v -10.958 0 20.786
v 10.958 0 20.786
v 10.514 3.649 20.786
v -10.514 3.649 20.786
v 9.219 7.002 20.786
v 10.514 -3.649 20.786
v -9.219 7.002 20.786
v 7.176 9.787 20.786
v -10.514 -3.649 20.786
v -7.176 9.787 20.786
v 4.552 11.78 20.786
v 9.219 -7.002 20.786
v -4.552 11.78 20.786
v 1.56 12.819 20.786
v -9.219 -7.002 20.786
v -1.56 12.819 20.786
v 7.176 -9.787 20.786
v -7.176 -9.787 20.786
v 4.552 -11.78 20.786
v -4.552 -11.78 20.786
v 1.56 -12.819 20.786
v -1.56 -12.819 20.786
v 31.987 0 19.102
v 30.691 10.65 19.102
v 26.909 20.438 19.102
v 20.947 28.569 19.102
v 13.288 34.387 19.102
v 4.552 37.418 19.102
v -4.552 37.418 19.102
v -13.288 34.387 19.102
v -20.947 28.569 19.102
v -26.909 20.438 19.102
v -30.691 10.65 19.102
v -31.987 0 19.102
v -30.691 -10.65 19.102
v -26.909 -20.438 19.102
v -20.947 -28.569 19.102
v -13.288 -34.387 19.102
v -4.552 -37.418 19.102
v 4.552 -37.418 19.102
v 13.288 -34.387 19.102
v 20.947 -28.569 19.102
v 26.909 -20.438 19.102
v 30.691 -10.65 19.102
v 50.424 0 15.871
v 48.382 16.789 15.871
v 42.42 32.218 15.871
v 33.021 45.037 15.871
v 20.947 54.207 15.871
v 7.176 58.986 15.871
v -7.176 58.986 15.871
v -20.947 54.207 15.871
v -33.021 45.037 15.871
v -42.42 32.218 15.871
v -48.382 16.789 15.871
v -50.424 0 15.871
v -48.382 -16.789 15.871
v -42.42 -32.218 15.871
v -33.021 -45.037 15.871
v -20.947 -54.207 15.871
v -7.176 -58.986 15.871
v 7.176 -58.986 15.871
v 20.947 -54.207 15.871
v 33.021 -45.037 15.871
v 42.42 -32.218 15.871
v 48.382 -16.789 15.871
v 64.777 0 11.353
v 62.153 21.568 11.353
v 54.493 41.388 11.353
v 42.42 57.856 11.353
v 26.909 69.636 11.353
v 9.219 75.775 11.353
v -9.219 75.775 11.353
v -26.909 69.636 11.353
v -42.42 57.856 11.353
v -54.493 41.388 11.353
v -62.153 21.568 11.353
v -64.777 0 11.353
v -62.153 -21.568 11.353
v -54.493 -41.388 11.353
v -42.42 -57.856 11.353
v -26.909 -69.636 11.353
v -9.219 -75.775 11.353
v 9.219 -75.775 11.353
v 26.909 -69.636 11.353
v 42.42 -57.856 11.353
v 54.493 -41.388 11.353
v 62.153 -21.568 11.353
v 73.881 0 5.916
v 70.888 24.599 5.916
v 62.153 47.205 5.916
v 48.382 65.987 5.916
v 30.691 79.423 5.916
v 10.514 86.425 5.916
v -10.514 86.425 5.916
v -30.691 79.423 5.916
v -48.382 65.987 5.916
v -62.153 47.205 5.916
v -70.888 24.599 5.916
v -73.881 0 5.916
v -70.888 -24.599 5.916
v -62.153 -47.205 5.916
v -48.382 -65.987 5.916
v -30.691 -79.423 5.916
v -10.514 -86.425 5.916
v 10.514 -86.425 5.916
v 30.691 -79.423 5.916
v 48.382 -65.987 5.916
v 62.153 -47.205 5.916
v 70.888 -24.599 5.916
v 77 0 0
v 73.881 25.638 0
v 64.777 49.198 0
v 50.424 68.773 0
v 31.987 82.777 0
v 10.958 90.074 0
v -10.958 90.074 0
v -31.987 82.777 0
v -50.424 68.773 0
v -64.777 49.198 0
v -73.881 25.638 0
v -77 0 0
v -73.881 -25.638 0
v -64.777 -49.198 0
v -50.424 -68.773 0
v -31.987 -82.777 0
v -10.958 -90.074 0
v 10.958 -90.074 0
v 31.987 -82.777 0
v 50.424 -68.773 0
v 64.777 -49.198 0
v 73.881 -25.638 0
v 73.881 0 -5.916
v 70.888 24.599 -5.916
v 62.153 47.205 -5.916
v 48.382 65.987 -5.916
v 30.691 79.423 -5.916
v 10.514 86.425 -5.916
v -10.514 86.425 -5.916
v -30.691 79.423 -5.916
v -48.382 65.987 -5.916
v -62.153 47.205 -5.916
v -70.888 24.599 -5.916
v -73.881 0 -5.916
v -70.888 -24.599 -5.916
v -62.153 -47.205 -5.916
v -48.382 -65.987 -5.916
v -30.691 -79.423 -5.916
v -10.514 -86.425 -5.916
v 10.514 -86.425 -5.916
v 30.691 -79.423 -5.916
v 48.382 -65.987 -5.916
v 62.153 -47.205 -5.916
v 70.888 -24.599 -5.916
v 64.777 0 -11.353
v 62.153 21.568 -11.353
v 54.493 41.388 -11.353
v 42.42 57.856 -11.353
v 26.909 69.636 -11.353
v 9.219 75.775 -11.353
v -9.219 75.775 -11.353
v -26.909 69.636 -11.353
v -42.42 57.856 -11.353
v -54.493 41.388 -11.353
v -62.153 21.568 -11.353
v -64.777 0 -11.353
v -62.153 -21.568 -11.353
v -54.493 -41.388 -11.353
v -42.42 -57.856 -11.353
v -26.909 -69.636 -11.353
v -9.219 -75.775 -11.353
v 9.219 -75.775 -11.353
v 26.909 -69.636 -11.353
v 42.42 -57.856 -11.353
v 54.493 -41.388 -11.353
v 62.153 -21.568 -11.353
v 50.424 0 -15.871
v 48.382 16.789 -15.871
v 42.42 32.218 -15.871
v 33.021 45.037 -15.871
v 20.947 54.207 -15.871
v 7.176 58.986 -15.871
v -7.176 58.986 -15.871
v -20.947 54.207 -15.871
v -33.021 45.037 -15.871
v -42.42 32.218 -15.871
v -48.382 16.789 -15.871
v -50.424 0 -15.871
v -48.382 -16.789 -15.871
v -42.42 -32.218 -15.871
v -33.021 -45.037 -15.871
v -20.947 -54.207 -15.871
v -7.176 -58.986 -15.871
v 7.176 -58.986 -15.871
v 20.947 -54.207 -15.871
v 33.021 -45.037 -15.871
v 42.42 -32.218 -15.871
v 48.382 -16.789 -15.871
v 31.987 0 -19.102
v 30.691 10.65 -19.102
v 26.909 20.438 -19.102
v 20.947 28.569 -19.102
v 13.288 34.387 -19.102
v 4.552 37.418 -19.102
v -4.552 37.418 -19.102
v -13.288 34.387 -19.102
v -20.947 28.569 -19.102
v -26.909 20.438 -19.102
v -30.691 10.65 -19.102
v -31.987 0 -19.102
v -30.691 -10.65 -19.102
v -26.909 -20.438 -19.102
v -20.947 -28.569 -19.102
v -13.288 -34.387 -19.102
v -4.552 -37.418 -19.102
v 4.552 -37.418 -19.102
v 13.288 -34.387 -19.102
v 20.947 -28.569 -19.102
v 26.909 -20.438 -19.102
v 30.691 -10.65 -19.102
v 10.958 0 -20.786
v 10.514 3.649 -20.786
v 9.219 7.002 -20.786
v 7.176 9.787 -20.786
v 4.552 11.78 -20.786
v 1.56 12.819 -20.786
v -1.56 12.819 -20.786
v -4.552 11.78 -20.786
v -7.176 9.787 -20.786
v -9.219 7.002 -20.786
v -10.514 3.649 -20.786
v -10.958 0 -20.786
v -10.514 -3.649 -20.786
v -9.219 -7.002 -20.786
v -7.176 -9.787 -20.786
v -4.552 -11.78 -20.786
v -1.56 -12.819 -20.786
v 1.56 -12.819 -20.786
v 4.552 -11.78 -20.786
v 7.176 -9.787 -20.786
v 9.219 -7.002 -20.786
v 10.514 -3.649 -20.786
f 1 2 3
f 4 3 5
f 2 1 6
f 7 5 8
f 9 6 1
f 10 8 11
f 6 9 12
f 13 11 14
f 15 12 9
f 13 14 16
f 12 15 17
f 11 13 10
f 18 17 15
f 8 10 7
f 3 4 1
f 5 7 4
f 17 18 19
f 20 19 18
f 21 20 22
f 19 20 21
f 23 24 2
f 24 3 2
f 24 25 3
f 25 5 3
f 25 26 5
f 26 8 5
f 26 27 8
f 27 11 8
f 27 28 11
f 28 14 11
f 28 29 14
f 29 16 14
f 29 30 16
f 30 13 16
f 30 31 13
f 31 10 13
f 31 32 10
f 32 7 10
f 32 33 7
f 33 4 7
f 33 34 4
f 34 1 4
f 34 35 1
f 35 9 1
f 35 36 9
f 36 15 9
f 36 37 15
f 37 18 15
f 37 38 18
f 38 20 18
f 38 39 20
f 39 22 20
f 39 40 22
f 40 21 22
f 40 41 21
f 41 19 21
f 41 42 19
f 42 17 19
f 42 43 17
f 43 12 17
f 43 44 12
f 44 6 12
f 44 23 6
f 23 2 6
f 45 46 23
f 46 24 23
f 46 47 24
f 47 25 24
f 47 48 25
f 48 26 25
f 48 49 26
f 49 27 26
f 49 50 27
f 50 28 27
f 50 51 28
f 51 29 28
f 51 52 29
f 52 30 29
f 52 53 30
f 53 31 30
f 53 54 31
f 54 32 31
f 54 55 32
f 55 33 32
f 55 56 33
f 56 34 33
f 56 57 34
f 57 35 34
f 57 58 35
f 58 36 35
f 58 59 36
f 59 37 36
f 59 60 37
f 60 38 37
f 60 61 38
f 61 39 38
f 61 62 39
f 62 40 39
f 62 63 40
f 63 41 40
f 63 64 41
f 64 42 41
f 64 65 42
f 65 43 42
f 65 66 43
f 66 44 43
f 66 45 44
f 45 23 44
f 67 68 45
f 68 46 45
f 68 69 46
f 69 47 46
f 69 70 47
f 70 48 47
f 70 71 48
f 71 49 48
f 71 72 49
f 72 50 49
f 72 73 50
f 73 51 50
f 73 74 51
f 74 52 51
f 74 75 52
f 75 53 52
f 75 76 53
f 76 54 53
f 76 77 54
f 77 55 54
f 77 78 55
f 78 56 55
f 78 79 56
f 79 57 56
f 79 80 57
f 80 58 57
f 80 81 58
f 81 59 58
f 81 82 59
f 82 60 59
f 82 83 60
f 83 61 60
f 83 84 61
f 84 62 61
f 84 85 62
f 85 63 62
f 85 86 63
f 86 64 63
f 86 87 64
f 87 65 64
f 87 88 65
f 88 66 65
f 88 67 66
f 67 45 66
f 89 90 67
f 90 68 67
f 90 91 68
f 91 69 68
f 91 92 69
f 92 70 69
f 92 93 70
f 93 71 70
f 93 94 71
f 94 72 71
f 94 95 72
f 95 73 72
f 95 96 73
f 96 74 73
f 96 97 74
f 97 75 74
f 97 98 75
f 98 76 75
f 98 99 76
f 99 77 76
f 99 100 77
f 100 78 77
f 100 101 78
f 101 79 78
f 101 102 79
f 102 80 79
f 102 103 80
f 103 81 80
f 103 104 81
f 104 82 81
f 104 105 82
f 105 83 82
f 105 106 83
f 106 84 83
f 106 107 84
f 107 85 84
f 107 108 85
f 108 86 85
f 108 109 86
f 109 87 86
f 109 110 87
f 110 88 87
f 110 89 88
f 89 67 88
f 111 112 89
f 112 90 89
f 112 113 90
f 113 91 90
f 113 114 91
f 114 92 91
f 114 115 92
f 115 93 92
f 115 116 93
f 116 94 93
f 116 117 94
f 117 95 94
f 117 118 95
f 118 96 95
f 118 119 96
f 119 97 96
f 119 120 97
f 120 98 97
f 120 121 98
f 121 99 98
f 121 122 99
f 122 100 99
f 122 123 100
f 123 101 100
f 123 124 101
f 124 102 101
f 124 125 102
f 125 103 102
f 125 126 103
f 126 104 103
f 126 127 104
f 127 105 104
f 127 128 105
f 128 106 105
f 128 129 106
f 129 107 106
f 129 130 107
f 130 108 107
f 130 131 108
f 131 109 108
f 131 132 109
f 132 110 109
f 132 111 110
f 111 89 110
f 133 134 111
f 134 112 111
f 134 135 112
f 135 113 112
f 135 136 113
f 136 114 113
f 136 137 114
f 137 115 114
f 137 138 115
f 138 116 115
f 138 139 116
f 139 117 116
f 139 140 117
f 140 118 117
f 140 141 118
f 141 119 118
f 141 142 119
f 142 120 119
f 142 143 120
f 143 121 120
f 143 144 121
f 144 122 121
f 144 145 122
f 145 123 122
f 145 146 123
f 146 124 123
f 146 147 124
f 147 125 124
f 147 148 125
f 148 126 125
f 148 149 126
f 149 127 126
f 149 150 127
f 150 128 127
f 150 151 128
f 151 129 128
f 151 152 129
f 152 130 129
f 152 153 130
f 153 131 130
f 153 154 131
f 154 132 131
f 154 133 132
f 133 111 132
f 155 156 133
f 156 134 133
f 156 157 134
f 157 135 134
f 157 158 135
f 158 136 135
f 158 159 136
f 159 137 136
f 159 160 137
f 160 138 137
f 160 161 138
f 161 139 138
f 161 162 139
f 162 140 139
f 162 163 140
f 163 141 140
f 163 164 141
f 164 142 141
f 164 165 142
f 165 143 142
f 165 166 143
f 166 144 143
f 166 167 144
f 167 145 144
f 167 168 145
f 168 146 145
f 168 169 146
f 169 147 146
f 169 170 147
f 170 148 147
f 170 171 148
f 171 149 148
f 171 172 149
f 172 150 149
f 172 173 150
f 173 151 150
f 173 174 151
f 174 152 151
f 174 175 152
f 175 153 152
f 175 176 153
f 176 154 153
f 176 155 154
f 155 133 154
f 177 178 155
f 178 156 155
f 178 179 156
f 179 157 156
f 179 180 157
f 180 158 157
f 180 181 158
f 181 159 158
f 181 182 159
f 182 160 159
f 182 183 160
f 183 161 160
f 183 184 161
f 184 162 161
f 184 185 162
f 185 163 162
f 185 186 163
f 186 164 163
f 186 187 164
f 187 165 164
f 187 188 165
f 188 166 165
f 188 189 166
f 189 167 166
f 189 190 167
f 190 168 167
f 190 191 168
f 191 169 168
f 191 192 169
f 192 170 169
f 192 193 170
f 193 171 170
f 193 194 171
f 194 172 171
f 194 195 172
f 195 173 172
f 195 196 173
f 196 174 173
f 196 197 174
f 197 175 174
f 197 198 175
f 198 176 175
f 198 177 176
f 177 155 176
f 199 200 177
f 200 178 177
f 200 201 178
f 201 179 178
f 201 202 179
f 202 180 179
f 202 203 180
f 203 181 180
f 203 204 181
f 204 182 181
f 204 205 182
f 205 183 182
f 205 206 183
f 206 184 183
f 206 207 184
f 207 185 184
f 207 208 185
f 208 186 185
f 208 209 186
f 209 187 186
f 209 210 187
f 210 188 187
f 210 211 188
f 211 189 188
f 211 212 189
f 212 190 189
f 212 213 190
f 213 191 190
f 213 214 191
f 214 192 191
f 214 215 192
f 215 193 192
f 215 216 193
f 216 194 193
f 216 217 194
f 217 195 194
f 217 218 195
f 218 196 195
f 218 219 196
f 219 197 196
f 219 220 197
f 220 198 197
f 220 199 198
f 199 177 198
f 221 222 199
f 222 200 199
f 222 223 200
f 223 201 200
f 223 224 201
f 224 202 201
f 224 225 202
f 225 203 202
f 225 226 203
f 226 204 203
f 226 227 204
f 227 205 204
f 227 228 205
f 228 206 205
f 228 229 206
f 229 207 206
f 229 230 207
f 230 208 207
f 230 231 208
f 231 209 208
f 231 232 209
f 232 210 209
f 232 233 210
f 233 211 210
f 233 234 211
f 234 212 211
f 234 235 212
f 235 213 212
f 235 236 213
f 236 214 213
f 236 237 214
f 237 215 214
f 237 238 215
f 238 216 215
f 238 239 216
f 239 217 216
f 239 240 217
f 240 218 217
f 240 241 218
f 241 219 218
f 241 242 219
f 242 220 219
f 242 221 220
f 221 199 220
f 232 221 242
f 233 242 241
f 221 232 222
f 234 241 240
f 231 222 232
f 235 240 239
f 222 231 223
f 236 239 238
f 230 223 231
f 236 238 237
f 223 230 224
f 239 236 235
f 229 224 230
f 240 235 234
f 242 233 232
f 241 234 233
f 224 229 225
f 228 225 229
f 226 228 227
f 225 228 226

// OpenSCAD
// Generated by SolidPython 1.0.1 on 2020-07-29 00:46:49


scale(v = [11, 13, 3]) {
	sphere(r = 7);
}
/***********************************************
*********      SolidPython code:      **********
************************************************
 
# import packages: SolidPython
from solid import *
from solid.utils import *
from itertools import chain, combinations, permutations


class Resize:

    def __init__(self, scad_file):
        self.scad_file = scad_file
        #self.scad_file = import_scad(scad_file)
        # cone/cylinder param:
        self.r1 = 0
        self.r2 = 0
        self.h = 0
        # rectangular prism param:
        self.w = 0
        self.l = 0
        # ellipse param:
        self.r = 0

    # import OpenScad code (file name corresponds to shape)


    # classify shape + parameters
    def assign(self, param1, param2, param3):
        if self.scad_file == 'cone.scad':
            self.r1 = param1
            self.r2 = param2
            self.h = param3
        elif self.scad_file == 'cylinder.scad':
            self.r1 = param1
            self.r2 = param2
            self.h = param3
        elif self.scad_file == 'rectangularPrism.scad':
            self.h = param1
            self.l = param2
            self.w = param3
        else:
            self.r = param1
            self.h = param2

    # resize parameters
    def iterate(self):
        x = range(3, 20, 2)
        i = 1
        if self.scad_file == 'cone.scad':
            tempList = list(permutations(x, 2))
            for temp in tempList:
                param1 = temp[0]
                param2 = temp[1]
                filepath = 'produced_scad_files/' + 'cone' + str(param1) + '_' + str(param2) + '_' + '.scad'
                scad_render_to_file(cylinder(h=param1, r1=param2, r2=0), filepath)

        elif self.scad_file == 'cylinder.scad':
            tempList = list(permutations(x, 3))
            for temp in tempList:
                param1 = temp[0]
                param2 = temp[1]
                filepath = 'produced_scad_files/' + 'cylinder' + str(param1) + '_' + str(param2) + '_' + '.scad'
                scad_render_to_file(cylinder(h=param1, r1=param2, r2=param2), filepath)

        elif self.scad_file == 'rectangularPrism.scad':
            tempList = list(permutations(x, 3))
            for temp in tempList:
                param1 = temp[0]
                param2 = temp[1]
                param3 = temp[2]
                filepath = 'produced_scad_files/' + 'rectangularPrism' + str(param1) + '_' + str(param2) + '_' + str(
                    param3) + '.scad'
                scad_render_to_file(cube(size=(param1, param2, param3)), filepath)

        elif self.scad_file == 'ellipse.scad':
            tempList = list(permutations(x, 4))
            for temp in tempList:
                param1 = temp[0]
                param2 = temp[1]
                param3 = temp[2]
                param4 = temp[3]
                filepath = 'produced_scad_files/' + 'ellipse' + str(param1) + '_' + str(param2) + '_' + str(param3) + '_' + str(param4) + '.scad'
                scad_render_to_file(scale([param1, param2, param3])(sphere(r=param4)), filepath)

    def render_to_scadfile(self):
        scad_render_to_file(scad, 'example.scad') 
 
************************************************/
